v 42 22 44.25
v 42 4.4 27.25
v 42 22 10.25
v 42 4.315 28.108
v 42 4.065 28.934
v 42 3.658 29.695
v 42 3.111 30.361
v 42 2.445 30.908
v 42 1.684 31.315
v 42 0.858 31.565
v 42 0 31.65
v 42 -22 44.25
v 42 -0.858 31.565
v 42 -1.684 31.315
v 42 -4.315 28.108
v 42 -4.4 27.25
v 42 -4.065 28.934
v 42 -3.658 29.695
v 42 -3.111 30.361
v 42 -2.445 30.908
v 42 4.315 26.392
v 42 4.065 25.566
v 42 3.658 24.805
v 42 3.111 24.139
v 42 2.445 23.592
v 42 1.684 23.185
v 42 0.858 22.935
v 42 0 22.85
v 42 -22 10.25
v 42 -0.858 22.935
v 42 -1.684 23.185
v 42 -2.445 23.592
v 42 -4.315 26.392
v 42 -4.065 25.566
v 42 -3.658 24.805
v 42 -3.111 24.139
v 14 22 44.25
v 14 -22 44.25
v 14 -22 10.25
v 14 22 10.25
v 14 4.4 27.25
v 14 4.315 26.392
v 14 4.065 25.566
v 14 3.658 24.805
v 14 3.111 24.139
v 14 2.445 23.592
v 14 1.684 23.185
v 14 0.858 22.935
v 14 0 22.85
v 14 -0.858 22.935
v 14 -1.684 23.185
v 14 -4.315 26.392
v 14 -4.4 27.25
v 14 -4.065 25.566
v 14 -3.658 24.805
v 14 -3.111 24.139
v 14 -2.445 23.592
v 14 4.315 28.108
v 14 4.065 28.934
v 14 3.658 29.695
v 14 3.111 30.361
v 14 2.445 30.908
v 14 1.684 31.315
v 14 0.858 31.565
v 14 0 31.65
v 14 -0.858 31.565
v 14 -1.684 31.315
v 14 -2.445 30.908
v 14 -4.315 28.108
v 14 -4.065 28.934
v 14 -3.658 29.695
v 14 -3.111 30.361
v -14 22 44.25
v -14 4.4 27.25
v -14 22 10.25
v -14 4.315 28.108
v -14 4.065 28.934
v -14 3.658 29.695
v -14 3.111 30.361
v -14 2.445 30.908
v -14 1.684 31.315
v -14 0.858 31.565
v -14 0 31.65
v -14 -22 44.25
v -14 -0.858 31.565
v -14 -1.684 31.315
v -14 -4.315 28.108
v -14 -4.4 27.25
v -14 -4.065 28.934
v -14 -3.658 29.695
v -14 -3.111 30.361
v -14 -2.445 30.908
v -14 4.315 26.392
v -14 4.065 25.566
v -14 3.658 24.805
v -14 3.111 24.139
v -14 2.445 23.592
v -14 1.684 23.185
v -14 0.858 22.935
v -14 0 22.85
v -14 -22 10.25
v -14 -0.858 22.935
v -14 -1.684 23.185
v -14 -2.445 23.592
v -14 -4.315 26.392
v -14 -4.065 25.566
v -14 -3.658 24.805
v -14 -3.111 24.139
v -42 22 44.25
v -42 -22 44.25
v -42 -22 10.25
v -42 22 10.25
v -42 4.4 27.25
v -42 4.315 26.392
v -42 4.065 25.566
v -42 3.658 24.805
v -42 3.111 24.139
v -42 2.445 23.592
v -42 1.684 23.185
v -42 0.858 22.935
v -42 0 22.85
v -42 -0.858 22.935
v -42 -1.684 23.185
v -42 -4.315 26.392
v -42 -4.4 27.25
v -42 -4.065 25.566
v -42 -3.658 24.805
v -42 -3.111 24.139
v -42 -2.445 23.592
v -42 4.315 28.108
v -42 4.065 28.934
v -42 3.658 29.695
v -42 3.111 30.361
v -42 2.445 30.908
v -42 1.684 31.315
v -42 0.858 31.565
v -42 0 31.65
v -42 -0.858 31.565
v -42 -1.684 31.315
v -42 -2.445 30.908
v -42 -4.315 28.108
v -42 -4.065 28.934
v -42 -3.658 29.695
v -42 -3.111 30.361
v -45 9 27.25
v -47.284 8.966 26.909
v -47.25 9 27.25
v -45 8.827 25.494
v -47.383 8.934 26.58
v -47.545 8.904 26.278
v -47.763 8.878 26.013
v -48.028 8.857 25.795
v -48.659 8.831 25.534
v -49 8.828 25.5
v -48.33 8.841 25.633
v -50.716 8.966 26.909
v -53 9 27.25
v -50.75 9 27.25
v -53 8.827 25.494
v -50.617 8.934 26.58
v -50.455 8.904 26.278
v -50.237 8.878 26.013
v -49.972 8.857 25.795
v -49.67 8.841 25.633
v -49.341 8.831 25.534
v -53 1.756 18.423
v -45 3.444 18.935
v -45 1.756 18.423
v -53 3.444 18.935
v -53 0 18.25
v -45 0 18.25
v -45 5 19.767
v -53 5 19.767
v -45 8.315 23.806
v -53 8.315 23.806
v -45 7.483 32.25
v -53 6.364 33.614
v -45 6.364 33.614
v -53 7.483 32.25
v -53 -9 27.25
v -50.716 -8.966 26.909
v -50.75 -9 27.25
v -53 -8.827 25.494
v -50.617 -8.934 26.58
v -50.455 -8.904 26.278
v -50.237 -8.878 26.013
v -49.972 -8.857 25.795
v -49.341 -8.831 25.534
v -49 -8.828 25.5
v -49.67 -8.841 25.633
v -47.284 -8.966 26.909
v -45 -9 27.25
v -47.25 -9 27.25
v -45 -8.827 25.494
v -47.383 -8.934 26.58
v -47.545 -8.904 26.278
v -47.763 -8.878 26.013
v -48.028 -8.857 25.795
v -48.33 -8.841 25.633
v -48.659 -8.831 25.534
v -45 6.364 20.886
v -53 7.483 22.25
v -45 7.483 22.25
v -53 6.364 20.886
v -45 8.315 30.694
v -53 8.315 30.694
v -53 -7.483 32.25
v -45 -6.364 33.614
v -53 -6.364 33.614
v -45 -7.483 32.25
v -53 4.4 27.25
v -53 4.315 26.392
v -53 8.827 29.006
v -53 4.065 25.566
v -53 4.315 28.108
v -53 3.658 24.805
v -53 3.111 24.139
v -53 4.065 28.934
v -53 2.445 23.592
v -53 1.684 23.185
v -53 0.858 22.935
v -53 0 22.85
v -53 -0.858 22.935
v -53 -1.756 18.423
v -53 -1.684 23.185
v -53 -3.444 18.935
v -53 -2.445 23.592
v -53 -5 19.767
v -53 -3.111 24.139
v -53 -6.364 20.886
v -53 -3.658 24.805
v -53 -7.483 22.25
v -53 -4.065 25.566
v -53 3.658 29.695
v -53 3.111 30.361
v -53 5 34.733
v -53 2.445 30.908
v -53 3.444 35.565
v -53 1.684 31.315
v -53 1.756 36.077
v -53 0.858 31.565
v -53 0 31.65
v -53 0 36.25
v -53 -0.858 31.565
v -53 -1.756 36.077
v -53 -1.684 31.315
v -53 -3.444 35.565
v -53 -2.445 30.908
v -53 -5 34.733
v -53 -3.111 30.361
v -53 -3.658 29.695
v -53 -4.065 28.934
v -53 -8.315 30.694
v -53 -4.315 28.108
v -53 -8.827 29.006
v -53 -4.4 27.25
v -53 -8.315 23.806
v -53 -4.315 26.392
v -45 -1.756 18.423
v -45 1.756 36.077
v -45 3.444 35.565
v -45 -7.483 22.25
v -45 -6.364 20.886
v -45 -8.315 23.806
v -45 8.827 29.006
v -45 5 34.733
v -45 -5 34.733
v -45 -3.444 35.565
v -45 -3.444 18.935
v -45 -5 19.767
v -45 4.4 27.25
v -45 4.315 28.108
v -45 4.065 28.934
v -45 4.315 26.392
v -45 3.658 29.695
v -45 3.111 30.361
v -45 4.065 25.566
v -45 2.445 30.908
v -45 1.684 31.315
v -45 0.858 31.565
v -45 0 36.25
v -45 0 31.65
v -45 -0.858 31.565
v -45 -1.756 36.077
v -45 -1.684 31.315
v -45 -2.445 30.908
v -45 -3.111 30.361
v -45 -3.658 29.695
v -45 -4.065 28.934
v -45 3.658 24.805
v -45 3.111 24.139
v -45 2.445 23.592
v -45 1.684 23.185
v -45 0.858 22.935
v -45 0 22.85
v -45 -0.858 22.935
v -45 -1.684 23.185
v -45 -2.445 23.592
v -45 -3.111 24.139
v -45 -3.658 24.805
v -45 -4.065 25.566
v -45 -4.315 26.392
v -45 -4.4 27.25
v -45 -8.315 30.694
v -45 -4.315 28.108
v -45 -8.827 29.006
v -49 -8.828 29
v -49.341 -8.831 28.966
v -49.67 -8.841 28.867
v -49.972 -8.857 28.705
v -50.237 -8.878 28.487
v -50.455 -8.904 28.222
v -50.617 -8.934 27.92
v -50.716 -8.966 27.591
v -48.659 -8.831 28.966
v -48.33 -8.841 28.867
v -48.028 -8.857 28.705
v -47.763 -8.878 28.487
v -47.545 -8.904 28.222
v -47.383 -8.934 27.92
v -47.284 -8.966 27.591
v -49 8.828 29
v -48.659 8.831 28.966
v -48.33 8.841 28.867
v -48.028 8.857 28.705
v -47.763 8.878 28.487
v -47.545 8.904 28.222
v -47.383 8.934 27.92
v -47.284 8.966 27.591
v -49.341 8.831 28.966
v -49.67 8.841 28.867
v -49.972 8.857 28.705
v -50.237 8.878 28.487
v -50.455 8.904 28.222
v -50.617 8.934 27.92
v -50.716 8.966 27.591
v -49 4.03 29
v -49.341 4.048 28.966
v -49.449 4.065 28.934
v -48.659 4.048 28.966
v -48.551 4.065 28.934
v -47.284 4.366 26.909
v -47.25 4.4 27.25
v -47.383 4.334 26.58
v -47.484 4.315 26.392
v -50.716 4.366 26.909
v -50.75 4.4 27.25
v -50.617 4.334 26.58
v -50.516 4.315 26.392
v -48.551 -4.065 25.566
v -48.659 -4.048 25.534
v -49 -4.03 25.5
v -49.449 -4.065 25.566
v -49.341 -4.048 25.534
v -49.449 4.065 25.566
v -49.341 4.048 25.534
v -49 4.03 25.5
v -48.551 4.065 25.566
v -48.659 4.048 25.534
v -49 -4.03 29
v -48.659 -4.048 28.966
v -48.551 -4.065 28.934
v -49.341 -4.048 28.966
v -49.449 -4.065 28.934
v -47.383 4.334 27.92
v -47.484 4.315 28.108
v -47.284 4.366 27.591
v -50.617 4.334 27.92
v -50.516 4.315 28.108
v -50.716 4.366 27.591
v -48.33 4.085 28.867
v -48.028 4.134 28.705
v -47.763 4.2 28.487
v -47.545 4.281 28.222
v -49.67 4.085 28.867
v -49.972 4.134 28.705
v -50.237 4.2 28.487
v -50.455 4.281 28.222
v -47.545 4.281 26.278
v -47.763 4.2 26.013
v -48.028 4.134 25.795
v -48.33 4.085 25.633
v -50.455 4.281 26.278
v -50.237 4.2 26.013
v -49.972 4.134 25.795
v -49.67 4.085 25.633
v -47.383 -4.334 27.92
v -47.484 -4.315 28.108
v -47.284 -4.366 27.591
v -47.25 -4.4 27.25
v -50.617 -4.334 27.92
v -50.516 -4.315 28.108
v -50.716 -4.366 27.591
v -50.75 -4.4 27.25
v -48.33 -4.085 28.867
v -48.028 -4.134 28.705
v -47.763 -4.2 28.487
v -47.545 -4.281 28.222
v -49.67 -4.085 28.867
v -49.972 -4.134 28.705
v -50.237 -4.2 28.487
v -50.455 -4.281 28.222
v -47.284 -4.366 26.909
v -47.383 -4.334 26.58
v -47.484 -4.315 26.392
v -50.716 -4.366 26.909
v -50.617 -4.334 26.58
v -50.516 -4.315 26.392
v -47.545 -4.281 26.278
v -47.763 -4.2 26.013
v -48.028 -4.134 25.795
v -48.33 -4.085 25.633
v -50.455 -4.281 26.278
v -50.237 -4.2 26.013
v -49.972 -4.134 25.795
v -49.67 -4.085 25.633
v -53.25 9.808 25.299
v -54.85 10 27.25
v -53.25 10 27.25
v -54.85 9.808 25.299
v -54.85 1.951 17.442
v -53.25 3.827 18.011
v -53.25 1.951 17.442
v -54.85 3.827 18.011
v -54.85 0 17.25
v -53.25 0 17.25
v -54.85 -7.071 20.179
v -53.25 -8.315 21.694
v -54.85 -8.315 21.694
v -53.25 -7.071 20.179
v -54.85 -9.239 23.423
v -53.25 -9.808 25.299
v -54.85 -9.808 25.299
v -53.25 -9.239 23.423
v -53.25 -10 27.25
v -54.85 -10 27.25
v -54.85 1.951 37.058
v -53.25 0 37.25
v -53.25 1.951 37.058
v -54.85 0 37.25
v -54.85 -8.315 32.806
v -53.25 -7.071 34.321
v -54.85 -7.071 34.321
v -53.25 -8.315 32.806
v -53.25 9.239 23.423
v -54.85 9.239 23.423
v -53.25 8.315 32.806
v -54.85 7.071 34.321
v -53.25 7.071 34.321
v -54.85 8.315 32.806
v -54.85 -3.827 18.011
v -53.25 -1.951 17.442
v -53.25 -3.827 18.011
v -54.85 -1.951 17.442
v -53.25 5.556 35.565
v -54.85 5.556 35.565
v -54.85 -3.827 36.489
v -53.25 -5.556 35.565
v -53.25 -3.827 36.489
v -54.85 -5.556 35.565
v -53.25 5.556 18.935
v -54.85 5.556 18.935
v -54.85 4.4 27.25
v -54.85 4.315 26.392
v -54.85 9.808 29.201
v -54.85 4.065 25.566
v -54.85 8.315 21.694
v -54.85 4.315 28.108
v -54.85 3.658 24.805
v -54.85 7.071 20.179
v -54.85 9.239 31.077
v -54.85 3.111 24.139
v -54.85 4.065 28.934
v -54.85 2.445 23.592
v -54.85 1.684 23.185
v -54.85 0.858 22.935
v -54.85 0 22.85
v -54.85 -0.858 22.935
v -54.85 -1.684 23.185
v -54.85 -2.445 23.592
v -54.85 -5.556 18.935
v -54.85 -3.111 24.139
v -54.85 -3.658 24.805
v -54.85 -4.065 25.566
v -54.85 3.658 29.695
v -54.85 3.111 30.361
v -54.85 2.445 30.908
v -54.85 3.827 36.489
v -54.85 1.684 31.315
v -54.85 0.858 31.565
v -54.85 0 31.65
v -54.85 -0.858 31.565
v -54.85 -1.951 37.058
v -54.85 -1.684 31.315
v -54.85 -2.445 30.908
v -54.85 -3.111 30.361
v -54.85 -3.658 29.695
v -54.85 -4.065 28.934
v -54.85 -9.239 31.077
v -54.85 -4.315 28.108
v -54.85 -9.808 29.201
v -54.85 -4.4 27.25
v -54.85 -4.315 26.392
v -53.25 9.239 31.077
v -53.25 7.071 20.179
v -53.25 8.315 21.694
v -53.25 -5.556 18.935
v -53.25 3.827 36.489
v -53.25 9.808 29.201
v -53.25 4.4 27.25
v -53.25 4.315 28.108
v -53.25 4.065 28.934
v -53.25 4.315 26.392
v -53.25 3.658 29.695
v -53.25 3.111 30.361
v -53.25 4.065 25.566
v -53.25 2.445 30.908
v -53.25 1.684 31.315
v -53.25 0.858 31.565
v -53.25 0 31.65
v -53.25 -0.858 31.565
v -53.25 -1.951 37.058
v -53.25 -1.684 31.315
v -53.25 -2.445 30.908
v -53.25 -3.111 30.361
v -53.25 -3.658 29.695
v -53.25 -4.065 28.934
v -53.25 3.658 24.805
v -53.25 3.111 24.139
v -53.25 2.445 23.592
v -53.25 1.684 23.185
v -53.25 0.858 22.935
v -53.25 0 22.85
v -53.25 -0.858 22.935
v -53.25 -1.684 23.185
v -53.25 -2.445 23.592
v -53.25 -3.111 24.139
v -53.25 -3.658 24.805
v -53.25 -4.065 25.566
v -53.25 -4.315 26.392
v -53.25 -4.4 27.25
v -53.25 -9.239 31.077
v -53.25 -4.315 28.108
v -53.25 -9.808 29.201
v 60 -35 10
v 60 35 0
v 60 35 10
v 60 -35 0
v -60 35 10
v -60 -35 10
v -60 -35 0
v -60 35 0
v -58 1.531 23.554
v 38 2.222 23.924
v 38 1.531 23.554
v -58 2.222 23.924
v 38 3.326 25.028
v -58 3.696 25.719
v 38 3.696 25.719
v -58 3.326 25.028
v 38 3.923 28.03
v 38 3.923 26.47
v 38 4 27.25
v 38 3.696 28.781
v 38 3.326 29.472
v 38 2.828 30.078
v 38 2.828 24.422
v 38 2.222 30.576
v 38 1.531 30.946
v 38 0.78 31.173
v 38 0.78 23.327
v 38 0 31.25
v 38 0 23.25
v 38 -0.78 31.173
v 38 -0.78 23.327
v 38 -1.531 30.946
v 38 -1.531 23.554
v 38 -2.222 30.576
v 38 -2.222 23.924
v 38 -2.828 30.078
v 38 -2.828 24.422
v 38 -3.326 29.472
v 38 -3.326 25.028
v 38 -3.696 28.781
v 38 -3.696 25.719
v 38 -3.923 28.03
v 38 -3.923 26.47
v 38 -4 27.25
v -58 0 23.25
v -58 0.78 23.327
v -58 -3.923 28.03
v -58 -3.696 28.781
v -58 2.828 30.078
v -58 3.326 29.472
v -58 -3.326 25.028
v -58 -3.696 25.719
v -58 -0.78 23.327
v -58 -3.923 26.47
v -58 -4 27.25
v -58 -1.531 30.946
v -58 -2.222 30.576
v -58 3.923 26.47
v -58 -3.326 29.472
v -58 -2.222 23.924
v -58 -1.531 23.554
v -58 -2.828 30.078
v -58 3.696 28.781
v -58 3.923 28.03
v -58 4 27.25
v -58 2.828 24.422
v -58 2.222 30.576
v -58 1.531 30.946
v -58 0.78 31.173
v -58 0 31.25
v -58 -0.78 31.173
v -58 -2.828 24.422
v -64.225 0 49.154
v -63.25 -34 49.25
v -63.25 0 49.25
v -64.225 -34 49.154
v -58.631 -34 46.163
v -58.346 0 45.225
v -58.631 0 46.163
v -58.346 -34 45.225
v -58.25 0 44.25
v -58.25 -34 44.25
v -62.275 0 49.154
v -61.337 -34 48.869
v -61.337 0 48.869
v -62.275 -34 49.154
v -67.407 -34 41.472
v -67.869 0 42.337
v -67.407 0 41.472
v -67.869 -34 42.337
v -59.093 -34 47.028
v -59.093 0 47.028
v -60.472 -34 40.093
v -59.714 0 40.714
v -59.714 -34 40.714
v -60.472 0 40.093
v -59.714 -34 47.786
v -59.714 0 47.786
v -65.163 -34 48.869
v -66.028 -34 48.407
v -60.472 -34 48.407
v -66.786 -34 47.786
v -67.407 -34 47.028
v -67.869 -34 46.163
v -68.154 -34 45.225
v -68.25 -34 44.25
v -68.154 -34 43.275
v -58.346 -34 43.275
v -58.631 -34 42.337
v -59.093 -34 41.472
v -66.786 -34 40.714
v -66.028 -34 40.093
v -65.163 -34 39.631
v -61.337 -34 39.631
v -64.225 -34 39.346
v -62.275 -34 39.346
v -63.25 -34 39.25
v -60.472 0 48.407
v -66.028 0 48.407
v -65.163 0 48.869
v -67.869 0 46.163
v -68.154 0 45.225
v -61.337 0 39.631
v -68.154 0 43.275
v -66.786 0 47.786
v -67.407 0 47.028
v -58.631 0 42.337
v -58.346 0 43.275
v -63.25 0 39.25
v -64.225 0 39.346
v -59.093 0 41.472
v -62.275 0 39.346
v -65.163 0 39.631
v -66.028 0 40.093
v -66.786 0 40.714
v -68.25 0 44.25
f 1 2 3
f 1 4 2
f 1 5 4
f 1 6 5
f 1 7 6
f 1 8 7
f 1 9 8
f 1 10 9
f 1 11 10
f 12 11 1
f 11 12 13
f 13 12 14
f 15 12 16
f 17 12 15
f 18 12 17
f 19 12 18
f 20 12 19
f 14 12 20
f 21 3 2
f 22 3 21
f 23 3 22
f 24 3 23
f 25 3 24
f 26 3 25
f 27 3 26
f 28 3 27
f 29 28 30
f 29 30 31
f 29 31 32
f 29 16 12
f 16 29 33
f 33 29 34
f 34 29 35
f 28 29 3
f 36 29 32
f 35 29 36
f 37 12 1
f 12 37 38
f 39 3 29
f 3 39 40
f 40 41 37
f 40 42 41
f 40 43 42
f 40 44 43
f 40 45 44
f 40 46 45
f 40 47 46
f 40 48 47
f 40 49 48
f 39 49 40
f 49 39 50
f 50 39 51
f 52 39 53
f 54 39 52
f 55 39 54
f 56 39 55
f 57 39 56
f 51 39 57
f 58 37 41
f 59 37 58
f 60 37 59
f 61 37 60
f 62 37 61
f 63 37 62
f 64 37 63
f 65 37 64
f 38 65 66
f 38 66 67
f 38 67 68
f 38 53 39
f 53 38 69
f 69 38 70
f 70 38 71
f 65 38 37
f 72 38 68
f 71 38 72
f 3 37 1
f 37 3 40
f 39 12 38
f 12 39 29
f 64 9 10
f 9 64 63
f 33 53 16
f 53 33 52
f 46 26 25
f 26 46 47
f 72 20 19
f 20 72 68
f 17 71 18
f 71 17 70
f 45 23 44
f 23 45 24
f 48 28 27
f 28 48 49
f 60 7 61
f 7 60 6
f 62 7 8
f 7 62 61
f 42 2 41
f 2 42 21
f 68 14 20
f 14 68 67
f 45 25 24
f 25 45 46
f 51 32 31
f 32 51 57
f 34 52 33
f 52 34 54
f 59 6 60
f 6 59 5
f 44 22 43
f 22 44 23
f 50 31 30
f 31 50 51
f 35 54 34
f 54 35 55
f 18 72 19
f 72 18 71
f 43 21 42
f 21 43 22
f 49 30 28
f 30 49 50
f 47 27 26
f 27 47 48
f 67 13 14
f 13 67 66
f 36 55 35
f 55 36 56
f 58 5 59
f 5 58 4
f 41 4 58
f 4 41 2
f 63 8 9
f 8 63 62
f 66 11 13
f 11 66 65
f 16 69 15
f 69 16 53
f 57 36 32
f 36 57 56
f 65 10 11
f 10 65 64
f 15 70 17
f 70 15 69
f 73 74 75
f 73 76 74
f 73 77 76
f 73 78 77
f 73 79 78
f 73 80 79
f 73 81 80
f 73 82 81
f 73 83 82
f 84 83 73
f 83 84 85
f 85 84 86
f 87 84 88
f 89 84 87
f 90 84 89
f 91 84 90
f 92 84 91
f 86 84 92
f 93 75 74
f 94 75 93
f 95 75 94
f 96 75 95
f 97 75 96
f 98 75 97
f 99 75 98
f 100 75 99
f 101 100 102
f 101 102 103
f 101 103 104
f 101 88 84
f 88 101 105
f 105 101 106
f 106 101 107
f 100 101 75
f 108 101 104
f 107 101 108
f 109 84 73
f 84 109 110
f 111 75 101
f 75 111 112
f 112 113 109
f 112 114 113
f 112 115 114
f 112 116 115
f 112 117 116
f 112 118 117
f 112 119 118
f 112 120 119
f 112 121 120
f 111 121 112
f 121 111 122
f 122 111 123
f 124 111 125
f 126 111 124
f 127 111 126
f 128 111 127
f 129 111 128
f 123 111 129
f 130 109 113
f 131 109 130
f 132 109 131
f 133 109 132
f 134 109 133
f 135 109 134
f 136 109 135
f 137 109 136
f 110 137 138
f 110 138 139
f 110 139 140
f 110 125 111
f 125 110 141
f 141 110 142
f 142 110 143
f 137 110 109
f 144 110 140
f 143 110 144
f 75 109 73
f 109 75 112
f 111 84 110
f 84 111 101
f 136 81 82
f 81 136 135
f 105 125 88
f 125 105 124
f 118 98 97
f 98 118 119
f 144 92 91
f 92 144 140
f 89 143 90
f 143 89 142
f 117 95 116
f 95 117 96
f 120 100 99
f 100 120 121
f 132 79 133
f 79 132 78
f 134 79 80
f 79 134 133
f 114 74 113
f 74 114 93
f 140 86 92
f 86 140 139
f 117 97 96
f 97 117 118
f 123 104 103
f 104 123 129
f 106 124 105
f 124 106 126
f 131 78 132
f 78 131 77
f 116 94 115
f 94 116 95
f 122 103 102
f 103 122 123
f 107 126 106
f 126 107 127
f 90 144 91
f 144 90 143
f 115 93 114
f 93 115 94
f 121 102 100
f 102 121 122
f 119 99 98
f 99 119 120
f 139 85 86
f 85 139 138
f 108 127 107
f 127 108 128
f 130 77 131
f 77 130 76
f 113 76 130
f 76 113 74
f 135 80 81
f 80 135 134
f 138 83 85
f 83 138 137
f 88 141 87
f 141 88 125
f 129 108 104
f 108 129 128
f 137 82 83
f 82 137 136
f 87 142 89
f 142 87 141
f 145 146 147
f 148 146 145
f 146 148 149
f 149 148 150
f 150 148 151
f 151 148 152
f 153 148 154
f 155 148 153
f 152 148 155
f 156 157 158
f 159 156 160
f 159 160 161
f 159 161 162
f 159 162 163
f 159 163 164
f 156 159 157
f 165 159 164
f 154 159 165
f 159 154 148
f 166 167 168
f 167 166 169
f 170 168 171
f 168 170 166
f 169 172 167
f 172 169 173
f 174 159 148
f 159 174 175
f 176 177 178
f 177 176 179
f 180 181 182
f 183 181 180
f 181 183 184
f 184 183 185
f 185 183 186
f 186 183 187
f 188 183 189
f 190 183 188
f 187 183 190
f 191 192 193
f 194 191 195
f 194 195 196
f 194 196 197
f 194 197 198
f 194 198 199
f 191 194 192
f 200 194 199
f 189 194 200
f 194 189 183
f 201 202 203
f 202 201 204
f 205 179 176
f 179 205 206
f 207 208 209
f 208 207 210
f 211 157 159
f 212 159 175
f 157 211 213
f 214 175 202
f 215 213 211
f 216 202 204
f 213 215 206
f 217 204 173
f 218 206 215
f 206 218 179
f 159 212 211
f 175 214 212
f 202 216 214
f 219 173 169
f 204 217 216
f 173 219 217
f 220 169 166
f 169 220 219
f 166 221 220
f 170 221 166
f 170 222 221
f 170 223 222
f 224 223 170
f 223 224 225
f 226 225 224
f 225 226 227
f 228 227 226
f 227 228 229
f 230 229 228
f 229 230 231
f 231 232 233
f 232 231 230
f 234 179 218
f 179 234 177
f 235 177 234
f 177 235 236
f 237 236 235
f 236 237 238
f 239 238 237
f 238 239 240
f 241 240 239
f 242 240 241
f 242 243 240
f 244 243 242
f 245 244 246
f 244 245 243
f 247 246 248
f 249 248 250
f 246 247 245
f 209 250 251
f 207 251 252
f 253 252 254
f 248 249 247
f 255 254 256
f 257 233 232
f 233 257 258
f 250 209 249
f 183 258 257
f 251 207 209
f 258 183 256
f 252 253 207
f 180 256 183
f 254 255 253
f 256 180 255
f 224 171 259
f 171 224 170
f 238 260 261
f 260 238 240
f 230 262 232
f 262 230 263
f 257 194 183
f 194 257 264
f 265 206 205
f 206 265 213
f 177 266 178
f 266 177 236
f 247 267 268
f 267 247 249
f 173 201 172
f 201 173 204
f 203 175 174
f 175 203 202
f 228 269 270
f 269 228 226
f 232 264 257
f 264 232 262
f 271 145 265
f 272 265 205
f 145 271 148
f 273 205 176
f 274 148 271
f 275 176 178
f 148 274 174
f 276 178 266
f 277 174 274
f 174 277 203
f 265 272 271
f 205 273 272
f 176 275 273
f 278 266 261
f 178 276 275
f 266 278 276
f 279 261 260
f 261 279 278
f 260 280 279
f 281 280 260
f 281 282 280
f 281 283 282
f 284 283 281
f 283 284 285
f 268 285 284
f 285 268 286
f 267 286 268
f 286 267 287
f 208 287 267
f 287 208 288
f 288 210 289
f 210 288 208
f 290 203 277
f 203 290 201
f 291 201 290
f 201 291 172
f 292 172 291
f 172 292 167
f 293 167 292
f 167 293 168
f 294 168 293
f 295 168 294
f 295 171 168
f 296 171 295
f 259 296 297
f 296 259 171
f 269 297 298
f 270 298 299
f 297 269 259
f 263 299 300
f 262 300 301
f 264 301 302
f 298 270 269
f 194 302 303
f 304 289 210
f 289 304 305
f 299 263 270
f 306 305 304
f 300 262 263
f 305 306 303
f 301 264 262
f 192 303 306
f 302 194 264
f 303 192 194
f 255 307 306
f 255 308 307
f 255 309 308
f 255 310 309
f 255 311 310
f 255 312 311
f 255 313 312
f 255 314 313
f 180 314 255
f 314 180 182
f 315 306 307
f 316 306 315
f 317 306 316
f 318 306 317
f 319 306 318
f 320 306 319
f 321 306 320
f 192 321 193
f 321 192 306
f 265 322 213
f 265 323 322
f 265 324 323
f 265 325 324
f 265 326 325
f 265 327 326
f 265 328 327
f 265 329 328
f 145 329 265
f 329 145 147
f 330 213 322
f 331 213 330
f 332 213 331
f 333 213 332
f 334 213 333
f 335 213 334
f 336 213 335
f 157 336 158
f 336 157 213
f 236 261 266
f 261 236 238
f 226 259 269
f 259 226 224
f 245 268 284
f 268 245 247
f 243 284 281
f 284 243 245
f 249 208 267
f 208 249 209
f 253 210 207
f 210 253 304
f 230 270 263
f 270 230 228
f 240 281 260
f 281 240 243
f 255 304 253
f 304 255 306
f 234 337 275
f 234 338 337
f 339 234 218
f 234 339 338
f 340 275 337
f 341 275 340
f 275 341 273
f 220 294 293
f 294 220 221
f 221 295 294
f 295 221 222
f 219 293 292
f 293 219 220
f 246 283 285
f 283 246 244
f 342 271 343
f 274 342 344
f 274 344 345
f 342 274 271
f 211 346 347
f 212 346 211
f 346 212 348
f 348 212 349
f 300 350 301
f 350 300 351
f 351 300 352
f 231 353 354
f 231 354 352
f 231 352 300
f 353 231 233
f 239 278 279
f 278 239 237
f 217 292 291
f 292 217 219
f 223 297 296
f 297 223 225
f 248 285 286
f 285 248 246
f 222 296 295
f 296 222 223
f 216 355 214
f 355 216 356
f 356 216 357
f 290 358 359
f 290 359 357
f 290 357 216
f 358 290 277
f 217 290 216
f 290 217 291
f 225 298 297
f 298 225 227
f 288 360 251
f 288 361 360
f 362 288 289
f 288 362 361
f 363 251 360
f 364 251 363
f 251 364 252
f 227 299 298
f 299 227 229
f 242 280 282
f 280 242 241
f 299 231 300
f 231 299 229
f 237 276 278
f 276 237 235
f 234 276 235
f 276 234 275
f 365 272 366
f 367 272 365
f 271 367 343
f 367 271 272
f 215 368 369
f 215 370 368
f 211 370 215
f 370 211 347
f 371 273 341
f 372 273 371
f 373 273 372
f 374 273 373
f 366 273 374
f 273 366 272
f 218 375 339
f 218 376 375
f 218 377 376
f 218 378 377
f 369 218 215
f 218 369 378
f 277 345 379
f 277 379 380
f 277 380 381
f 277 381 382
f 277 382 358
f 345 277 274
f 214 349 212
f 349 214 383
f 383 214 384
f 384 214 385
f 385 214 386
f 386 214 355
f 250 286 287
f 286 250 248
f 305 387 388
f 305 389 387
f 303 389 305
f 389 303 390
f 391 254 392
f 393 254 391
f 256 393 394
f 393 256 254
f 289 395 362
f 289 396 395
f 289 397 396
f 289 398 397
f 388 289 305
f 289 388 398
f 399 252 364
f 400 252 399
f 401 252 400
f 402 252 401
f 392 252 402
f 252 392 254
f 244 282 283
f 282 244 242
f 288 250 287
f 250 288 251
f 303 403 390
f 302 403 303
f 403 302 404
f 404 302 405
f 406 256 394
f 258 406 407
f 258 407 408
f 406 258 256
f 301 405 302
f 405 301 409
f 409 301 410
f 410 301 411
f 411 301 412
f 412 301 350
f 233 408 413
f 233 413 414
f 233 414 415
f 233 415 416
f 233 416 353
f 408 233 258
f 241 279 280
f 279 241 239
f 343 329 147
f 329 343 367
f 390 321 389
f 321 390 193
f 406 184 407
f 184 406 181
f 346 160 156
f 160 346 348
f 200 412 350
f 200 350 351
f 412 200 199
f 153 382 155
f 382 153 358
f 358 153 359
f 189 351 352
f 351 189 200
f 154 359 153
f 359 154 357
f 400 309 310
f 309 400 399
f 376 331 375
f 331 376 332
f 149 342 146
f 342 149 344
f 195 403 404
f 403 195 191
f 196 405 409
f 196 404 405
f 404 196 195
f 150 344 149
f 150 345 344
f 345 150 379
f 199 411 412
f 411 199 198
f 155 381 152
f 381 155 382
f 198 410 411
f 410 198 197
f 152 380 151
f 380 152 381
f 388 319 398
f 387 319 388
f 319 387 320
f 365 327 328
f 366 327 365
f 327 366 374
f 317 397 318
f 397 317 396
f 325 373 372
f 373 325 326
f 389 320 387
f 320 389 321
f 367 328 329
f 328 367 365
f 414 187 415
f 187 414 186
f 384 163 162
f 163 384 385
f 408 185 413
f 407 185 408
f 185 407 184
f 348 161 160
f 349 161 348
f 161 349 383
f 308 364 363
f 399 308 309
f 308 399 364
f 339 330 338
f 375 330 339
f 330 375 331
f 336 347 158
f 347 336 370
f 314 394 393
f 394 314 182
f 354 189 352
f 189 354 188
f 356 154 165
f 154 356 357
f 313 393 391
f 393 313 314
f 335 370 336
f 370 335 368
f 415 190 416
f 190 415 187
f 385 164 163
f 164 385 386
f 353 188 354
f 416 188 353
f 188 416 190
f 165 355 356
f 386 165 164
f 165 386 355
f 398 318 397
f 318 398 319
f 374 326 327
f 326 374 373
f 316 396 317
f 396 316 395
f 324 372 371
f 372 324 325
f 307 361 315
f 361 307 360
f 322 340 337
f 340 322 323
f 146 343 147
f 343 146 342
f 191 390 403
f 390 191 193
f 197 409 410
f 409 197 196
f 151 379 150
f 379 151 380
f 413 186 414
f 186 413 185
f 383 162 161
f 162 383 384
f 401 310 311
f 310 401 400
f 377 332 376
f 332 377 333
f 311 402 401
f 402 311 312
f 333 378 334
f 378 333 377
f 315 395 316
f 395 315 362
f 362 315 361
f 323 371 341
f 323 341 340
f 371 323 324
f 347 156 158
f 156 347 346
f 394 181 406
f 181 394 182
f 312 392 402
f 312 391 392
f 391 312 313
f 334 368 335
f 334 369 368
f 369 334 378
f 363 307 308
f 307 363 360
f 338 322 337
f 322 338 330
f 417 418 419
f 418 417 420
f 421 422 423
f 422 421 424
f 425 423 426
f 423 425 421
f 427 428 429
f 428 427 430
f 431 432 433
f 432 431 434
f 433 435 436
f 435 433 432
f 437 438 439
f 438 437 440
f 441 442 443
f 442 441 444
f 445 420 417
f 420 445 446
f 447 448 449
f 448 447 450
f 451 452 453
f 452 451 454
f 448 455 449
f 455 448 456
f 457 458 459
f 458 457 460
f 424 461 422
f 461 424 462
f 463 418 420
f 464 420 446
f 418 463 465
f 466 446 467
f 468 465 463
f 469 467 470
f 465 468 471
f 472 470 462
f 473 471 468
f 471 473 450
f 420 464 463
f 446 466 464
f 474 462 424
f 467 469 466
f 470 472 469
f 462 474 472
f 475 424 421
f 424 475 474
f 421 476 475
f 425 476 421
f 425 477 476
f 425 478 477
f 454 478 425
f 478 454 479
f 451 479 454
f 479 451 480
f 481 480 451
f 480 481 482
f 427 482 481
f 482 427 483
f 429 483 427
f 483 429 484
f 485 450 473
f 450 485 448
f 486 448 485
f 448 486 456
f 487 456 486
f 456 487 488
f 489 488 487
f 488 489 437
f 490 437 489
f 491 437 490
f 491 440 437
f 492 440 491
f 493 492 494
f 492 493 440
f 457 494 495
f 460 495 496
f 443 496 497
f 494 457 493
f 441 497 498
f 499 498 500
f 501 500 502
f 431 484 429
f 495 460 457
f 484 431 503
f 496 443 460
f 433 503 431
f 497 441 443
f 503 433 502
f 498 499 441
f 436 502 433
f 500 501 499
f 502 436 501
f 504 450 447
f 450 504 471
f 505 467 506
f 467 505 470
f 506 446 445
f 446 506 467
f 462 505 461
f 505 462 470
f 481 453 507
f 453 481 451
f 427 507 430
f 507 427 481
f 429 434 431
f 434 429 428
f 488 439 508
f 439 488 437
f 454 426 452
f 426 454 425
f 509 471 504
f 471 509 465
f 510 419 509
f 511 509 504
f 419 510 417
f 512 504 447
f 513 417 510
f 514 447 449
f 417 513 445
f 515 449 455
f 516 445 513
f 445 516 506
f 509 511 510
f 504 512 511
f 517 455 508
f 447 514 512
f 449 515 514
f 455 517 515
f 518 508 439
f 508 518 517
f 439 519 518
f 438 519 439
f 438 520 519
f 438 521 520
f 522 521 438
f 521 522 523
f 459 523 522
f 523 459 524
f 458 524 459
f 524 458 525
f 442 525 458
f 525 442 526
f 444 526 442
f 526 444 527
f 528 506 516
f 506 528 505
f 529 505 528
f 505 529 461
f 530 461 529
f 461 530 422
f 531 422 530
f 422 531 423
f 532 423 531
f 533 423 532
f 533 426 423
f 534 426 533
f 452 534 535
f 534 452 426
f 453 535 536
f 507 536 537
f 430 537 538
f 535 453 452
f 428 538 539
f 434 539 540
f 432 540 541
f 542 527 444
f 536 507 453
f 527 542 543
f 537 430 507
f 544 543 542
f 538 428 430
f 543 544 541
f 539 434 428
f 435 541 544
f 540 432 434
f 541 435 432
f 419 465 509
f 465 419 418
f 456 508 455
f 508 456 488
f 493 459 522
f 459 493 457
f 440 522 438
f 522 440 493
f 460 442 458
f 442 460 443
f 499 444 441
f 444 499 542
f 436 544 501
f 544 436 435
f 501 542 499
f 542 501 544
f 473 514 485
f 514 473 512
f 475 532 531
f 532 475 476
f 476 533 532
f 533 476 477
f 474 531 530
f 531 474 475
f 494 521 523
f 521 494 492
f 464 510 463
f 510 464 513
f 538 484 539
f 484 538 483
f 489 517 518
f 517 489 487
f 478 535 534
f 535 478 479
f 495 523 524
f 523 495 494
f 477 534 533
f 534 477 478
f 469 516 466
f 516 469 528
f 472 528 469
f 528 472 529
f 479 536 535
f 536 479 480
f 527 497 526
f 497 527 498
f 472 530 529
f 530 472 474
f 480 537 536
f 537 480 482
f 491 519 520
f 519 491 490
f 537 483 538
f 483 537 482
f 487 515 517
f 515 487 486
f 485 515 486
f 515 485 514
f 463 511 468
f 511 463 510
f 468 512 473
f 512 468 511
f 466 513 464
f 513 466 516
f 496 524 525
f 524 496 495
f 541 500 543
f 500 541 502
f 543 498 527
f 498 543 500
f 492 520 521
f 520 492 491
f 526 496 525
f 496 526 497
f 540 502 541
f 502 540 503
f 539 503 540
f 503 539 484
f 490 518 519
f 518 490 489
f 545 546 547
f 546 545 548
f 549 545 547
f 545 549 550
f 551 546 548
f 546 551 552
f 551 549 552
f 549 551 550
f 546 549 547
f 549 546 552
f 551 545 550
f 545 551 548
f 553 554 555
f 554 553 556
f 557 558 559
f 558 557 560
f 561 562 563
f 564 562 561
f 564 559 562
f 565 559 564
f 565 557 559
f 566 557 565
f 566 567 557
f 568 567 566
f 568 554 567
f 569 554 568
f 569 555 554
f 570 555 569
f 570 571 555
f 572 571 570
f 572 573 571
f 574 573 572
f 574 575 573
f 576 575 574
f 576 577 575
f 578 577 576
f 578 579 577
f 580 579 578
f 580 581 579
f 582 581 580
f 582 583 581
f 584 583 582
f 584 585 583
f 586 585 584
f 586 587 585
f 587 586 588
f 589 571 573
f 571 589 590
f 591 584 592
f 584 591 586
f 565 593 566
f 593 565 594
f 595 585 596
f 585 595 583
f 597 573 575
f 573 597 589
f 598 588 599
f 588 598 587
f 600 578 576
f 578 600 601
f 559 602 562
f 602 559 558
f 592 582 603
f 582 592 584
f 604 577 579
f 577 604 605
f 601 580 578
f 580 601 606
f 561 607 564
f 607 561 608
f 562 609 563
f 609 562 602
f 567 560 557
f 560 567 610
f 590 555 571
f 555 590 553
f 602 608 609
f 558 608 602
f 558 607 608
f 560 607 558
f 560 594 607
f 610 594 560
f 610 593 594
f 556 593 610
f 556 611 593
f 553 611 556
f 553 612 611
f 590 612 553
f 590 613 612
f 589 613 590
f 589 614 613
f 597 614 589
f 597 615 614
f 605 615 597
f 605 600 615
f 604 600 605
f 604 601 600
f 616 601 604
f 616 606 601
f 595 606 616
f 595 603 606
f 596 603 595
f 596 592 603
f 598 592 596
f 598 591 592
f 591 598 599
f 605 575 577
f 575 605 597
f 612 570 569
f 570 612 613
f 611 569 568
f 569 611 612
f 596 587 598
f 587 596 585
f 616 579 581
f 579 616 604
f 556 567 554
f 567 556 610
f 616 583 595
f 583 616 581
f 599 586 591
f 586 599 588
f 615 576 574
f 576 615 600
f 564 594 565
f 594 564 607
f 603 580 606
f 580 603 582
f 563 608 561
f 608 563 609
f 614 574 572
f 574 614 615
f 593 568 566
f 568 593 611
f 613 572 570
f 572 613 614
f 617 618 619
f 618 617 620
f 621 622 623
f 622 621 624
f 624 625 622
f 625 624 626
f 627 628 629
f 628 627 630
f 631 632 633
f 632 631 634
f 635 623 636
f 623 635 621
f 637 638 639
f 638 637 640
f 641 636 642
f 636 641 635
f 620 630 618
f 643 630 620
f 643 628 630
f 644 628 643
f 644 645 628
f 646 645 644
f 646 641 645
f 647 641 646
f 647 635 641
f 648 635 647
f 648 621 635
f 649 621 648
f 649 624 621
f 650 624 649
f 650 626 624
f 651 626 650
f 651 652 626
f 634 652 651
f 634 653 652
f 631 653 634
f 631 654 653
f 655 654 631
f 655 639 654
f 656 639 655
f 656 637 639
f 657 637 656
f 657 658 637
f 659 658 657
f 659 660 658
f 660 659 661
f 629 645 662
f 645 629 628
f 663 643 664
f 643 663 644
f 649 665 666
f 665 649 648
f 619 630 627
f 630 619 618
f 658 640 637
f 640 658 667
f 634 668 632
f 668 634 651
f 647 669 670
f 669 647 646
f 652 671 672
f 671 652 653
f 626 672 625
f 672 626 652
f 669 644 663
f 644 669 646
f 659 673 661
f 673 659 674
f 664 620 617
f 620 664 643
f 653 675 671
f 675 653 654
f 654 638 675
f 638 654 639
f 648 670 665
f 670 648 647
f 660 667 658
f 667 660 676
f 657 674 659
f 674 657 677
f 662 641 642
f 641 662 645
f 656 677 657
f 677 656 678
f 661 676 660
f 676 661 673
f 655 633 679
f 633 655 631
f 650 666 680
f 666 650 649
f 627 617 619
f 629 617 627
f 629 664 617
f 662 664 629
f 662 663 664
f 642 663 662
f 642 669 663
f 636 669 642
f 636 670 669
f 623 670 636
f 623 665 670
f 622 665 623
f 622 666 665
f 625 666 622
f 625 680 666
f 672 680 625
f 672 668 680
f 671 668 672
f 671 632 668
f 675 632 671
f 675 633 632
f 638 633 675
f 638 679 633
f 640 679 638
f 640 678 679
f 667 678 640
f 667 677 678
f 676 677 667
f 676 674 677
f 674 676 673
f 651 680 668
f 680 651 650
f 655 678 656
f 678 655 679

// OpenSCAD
$fn = 32;

// ------------------------------------------------------------------------
// Machine vise: screw d8, jaws 28 x 34 mm
// Every part is its own module, assembly() places every instance.
// ------------------------------------------------------------------------

// --- part 1 ---
module vise_bed() {
  difference() {
    translate([-60, -35, 0]) cube([120, 70, 10]);
  }
}

// --- part 2 ---
module vise_jaw() {
  difference() {
    translate([-14, -22, 0]) cube([28, 44, 34]);
    translate([0, 0, 17]) rotate([0, 90, 0]) cylinder(h = 30, d = 8.8, center = true);
  }
}

// --- part 3 ---
module vise_screw() {
  translate([0, 0, -48]) cylinder(h = 96, d = 8);
}

// --- part 4 ---
module screw_collar() {
  difference() {
    cylinder(h = 8, d = 18);
    translate([0, 0, -1]) cylinder(h = 10, d = 8.8);
    translate([0, 0, 4]) rotate([90, 0, 0]) cylinder(h = 20, d = 3.5, center = true);
  }
}

// --- part 5 ---
module screw_washer() {
  difference() {
      translate([0, 0, 0]) cylinder(h = 1.6, d = 20);
      translate([0, 0, -1]) cylinder(h = 3.6, d = 8.8);
    }
}

// --- part 6 ---
module vise_handle() {
  cylinder(h = 34, d = 10);
}

// --- assembly ---
module assembly() {
  color([0.80, 0.24, 0.20]) translate([0, 0, 0]) rotate([0, 0, 0]) vise_bed();
  color([0.20, 0.45, 0.75]) translate([28, 0, 10.25]) rotate([0, 0, 0]) vise_jaw();
  color([0.25, 0.62, 0.32]) translate([-28, 0, 10.25]) rotate([0, 0, 0]) vise_jaw();
  color([0.92, 0.70, 0.18]) translate([-10, 0, 27.25]) rotate([0, 90, 0]) vise_screw();
  color([0.58, 0.35, 0.70]) translate([-53, 0, 27.25]) rotate([0, 90, 0]) screw_collar();
  color([0.16, 0.66, 0.66]) translate([-54.85, 0, 27.25]) rotate([0, 90, 0]) screw_washer();
  color([0.85, 0.48, 0.18]) translate([-63.25, 0, 44.25]) rotate([90, 0, 0]) vise_handle();
}

assembly();
